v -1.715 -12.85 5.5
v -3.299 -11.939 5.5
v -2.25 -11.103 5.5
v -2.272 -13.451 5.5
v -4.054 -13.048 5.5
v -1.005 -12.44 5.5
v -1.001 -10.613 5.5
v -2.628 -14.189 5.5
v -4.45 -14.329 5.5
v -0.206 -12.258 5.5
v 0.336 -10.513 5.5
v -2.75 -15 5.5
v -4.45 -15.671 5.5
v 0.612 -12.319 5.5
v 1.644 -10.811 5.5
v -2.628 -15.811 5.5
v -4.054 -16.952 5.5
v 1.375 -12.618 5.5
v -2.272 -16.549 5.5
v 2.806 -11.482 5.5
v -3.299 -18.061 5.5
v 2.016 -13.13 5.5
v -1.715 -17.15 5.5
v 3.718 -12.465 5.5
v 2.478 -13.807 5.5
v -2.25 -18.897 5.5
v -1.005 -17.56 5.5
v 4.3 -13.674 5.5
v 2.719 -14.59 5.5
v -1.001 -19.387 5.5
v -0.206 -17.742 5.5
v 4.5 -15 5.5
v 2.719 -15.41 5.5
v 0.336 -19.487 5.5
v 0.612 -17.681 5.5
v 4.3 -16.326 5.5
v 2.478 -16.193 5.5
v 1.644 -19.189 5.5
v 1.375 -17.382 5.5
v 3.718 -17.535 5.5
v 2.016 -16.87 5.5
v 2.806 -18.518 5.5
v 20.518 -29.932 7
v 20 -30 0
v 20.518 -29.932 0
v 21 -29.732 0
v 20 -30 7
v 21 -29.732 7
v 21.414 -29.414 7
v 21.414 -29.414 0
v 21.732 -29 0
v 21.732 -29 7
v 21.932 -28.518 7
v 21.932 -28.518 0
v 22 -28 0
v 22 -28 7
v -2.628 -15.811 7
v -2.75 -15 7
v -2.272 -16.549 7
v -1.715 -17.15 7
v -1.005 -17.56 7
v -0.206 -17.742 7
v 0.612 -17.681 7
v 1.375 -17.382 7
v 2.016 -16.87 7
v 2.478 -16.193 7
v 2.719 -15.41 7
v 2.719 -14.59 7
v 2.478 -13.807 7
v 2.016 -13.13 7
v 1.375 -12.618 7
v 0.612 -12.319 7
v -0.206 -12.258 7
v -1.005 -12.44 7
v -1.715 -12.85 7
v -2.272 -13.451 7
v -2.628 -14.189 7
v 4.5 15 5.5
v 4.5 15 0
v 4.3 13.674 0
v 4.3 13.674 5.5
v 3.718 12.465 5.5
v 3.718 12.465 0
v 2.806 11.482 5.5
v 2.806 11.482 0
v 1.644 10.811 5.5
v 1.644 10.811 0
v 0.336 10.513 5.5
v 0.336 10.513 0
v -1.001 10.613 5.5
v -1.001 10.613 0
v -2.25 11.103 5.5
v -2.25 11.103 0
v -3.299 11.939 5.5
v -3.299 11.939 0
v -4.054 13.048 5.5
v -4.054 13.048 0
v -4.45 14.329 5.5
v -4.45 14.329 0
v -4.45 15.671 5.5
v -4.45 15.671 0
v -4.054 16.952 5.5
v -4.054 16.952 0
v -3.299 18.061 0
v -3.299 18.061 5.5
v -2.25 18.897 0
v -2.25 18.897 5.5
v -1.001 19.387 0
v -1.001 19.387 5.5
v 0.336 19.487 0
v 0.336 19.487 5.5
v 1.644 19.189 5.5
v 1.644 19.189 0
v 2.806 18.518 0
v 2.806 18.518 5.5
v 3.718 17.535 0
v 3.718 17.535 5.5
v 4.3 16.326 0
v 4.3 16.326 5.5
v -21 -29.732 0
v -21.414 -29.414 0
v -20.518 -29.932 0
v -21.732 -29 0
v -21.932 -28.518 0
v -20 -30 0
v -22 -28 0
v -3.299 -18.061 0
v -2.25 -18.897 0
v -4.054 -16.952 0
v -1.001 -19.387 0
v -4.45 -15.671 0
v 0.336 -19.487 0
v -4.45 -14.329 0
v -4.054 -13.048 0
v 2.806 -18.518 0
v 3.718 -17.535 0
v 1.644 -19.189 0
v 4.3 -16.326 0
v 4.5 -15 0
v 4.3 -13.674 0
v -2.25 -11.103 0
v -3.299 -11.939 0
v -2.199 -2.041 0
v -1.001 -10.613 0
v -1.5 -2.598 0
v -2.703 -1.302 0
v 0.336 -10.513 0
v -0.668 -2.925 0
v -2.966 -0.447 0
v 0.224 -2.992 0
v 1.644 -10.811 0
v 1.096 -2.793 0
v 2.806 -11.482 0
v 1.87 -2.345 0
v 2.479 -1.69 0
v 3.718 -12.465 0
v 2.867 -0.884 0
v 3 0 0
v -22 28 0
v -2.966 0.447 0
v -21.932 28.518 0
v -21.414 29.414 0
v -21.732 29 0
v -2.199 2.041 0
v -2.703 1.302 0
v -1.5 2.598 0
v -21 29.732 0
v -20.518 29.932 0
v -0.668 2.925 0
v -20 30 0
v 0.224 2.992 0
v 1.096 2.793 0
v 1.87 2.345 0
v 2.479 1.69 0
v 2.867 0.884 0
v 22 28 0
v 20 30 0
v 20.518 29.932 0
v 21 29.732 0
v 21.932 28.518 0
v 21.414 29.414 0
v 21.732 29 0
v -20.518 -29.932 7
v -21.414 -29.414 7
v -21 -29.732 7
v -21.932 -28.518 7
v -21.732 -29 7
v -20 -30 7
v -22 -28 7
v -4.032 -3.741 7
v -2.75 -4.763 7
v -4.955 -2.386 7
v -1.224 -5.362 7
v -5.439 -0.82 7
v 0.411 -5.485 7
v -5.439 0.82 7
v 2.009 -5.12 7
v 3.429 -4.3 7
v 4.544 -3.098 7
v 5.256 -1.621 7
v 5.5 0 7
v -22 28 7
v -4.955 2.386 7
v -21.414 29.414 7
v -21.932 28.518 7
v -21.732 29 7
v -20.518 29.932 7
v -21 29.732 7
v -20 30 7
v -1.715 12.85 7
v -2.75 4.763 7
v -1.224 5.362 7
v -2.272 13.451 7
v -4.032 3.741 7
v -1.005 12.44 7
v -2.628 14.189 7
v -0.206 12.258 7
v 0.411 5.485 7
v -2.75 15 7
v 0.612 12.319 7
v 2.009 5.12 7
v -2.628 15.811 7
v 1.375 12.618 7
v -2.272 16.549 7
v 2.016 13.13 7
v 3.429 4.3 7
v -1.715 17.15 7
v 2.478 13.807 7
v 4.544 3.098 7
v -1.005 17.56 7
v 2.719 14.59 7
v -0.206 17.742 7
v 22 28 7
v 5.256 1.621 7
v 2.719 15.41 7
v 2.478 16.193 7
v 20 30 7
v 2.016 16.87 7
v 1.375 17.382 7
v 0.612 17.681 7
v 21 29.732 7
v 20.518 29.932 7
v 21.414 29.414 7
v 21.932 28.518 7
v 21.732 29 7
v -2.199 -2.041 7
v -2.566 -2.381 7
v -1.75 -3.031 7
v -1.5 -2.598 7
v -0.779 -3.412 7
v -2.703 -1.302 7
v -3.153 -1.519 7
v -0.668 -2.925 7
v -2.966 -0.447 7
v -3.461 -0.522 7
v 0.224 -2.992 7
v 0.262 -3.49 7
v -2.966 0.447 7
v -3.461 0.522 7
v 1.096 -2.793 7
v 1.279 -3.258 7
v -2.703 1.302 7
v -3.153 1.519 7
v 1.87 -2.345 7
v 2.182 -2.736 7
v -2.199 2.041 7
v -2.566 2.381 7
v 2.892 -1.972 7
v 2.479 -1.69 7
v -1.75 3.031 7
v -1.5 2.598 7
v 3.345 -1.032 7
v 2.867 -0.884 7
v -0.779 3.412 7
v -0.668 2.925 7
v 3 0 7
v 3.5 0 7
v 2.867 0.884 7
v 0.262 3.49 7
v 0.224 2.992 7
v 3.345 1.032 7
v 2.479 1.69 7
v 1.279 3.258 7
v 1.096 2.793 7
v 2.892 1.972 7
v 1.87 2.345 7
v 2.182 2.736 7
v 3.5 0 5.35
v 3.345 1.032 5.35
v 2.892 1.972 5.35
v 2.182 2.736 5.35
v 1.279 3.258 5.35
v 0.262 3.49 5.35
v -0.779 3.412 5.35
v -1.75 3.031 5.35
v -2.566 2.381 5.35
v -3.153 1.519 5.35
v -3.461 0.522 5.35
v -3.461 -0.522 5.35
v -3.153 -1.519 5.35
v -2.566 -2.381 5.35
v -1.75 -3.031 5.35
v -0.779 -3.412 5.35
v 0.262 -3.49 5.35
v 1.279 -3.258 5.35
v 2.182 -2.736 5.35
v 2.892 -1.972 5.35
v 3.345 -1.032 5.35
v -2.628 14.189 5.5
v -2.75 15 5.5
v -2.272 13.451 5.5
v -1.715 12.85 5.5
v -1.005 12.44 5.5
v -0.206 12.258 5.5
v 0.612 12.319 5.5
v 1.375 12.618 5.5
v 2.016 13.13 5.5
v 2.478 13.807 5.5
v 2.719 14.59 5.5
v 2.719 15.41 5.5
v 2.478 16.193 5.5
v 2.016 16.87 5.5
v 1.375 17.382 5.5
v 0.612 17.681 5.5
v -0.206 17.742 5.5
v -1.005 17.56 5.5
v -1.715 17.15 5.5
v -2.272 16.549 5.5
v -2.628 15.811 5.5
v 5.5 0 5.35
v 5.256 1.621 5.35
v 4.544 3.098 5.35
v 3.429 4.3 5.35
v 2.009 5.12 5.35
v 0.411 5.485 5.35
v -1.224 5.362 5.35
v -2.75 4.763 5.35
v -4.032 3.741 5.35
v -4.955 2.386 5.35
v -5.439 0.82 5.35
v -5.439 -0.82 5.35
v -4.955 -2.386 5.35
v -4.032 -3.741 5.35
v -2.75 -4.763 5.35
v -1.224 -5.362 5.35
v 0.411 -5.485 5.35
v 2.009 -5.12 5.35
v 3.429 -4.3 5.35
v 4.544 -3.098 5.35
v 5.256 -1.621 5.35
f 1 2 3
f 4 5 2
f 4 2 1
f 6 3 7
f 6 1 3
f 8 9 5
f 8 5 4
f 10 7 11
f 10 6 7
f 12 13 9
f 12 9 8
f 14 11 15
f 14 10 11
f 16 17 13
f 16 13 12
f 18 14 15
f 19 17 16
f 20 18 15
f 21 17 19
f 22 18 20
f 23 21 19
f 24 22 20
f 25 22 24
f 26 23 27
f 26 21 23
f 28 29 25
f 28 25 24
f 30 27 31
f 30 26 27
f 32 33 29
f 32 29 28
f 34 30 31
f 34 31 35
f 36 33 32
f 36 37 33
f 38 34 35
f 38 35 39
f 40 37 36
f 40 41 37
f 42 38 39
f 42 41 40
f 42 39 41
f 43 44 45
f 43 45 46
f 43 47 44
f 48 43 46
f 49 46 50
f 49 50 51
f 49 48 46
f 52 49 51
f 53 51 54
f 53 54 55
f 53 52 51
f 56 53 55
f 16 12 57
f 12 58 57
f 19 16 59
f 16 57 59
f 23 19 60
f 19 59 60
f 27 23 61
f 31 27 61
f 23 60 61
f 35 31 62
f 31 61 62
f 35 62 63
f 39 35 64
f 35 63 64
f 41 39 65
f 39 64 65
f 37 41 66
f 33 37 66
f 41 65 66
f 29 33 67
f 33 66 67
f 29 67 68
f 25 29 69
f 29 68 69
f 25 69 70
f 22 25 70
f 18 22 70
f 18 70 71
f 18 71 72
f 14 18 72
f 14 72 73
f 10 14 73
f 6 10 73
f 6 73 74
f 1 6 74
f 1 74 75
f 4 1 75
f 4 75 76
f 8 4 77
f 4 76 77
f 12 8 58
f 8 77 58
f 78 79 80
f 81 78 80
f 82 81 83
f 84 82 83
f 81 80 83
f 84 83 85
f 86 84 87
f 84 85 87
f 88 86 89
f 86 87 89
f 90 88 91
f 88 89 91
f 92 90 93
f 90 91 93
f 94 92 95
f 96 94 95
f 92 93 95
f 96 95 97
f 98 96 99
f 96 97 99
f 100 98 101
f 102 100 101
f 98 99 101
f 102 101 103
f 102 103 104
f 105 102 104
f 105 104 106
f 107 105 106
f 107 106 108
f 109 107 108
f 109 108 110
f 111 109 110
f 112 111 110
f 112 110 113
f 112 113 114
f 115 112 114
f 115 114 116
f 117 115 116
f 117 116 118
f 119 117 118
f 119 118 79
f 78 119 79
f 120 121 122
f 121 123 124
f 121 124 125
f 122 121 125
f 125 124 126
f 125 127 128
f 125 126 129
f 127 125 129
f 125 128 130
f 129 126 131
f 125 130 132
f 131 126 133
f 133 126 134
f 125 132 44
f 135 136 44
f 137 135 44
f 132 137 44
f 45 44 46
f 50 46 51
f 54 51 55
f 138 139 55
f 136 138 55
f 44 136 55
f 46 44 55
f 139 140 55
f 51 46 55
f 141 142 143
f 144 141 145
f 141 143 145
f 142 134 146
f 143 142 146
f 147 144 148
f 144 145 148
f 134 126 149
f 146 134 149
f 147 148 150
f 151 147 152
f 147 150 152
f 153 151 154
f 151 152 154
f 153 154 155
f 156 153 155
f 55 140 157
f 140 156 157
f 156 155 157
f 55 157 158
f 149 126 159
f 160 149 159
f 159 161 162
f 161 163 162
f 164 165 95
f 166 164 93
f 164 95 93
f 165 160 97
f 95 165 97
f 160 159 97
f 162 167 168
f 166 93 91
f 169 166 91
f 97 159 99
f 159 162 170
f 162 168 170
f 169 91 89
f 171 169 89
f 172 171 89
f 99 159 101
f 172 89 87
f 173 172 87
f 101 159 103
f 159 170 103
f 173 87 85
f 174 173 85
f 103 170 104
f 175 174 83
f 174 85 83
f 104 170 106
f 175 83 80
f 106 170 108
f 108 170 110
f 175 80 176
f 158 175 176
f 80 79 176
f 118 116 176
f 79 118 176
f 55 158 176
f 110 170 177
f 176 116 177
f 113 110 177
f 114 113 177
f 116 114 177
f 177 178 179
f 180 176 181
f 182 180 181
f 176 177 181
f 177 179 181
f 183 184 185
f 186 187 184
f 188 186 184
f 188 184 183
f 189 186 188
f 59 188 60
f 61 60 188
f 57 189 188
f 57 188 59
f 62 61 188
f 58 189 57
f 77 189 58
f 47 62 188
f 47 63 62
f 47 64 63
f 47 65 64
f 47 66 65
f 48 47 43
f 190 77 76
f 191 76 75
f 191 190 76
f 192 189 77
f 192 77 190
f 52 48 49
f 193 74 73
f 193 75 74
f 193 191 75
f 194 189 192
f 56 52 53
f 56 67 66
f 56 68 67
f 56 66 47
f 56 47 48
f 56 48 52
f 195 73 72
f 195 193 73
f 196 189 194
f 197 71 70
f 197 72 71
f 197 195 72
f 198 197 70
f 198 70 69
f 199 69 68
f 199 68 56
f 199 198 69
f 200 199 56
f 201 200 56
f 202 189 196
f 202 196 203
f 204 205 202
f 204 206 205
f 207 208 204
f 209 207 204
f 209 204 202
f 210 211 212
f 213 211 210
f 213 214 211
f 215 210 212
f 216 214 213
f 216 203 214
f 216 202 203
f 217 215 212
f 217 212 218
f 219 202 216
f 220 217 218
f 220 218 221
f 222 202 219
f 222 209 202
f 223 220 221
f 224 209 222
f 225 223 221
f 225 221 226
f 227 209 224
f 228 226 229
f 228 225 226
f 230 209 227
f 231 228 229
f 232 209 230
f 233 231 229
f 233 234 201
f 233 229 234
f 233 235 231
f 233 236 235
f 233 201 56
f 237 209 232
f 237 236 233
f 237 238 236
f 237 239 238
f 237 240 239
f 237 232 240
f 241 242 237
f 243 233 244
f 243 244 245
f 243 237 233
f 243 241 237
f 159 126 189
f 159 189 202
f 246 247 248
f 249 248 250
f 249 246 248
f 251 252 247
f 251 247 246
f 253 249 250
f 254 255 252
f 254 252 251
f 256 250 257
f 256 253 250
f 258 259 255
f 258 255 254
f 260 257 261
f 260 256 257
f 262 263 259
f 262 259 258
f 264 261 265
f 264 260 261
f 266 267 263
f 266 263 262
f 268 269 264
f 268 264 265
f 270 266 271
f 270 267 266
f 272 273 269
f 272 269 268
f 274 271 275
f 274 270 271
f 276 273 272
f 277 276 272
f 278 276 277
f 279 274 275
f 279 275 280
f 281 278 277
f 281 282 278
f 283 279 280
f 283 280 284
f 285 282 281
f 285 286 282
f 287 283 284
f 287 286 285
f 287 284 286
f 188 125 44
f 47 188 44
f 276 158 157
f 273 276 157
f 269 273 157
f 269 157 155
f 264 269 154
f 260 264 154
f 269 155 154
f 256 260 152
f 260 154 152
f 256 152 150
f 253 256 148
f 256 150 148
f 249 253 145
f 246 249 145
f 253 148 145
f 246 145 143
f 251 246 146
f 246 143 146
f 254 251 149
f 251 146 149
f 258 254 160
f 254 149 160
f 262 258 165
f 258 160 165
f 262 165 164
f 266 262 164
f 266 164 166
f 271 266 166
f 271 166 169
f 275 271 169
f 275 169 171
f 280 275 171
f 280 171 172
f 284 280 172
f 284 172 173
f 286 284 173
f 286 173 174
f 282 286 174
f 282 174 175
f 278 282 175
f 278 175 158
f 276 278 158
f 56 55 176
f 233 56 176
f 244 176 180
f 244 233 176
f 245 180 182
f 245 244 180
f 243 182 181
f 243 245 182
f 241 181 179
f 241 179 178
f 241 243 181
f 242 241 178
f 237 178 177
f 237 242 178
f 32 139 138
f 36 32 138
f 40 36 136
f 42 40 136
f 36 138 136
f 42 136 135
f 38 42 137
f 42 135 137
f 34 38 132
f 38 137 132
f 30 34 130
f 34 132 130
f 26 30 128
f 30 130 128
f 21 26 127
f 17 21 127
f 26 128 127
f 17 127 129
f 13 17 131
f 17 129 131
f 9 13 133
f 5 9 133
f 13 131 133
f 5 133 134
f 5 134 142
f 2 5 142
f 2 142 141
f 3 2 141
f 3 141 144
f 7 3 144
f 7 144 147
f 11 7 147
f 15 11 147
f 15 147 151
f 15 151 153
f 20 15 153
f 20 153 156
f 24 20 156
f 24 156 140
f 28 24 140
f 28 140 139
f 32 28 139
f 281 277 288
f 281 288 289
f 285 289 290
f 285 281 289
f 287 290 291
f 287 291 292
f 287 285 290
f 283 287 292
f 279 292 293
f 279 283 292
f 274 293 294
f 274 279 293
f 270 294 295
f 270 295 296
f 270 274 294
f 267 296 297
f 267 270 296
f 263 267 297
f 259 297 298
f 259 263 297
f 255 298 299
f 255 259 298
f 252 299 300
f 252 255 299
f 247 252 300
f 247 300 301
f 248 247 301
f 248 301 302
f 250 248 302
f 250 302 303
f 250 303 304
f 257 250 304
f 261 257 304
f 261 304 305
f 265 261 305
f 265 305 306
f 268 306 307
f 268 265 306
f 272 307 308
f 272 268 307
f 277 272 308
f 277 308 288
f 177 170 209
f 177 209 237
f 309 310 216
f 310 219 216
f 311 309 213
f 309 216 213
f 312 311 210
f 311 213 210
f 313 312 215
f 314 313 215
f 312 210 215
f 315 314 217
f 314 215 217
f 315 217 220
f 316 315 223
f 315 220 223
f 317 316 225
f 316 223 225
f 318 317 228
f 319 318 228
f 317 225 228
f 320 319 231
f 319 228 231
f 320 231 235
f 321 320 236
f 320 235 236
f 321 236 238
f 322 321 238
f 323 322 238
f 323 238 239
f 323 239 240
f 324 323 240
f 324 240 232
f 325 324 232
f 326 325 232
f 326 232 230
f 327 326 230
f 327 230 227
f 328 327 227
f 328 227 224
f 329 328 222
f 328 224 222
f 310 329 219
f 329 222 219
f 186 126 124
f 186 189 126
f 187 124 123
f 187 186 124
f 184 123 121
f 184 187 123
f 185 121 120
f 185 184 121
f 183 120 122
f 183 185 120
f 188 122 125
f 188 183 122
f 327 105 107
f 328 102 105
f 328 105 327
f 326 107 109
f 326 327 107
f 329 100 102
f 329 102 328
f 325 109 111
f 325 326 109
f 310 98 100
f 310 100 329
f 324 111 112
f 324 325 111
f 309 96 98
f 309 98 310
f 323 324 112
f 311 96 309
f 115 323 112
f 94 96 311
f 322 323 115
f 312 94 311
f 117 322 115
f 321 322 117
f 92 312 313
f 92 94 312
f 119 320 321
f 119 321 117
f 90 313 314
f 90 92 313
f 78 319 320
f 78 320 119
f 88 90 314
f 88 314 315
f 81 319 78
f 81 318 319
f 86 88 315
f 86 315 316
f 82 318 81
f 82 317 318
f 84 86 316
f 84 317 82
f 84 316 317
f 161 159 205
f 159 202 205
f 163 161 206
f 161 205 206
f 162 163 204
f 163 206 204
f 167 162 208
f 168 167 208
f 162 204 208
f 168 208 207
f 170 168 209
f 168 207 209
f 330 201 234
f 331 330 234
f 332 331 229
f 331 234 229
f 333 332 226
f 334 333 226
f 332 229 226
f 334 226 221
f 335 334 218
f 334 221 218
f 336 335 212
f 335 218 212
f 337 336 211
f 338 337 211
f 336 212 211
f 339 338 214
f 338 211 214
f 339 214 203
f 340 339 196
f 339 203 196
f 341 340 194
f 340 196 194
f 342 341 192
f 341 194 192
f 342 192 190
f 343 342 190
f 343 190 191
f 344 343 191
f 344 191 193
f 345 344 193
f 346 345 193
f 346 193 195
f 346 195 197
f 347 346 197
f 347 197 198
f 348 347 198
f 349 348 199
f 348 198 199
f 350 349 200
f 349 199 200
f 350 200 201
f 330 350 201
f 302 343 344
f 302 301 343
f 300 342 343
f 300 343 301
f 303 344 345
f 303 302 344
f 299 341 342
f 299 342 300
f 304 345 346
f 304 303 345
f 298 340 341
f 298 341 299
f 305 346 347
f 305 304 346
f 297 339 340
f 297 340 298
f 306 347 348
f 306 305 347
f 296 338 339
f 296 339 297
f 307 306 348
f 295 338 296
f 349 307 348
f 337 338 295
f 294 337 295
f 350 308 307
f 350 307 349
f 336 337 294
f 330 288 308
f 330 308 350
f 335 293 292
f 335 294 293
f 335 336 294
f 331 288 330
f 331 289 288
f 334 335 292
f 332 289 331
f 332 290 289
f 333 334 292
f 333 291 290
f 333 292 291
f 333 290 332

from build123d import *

# Parameters (mm, degrees)
F0_W           = 44
F0_H           = 60
F1_DEPTH       = 7
F2_R           = 2
F3_R           = 3
F4_DEPTH       = 7.001
F5_D           = 5.5
F5_CBORE_D     = 9
F5_CBORE_DEPTH = 5.5
F6_R           = 5.5
F6_R_2         = 3.5
F7_DEPTH       = 1.65


with BuildPart() as f1:
    # F0 (on Top) → F1 (new body)
    with BuildSketch(Plane.XY):
        Rectangle(F0_W, F0_H)
    extrude(amount=F1_DEPTH)

    # F2
    f2_edges = [f1.edges().sort_by_distance(p)[0] for p in [
        (-22, -30, 3.5),
        (22, -30, 3.5),
        (22, 30, 3.5),
        (-22, 30, 3.5),
    ]]
    fillet(f2_edges, radius=F2_R)

    # F3 (on face) → F4 (cut, through all)
    with BuildSketch(Plane(origin=(0, 0, 0), x_dir=(1, 0, 0), z_dir=(0, 0, -1))):
        Circle(F3_R)
    extrude(amount=-F4_DEPTH, mode=Mode.SUBTRACT)

    # F5 (through all)
    with Locations(Plane(origin=(0, 0, 0), x_dir=(1, 0, 0), z_dir=(0, 0, -1))):
        with Locations((0, -15), (0, 15)):
            CounterBoreHole(F5_D / 2, F5_CBORE_D / 2, F5_CBORE_DEPTH)

    # F6 (on face) → F7 (cut)
    with BuildSketch(Plane.XY.offset(7)):
        Circle(F6_R)
        Circle(F6_R_2, mode=Mode.SUBTRACT)
    extrude(amount=-F7_DEPTH, mode=Mode.SUBTRACT)


solid = f1.part
